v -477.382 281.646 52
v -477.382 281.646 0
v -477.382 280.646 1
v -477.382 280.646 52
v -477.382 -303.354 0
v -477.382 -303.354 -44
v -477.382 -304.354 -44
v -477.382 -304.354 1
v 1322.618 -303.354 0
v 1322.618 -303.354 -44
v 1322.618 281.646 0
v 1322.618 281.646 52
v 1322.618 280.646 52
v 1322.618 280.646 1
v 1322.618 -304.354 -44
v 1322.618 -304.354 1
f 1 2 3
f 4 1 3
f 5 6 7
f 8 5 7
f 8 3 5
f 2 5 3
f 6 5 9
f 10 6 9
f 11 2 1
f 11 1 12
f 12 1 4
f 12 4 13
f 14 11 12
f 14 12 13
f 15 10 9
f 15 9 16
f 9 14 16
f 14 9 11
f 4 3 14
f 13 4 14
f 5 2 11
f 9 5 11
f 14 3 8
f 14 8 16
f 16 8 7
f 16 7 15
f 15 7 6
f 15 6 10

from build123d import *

# Parameters (mm, degrees)
F0_W     = 1800
F0_H     = 585
F1_DEPTH = 1
F0_H_2   = 1
F2_DEPTH = 52
F3_W     = 1800
F3_H     = 1
F4_DEPTH = 44


with BuildPart() as f1:
    # F0 (on Top) → F1 (new body)
    with BuildSketch(Plane.XY):
        with Locations((422.617722, -11.85421)):
            Rectangle(F0_W, F0_H)
    extrude(amount=F1_DEPTH)

    # F0 (on Top) → F2 (join)
    with BuildSketch(Plane.XY):
        with Locations((422.617722, 281.14579)):
            Rectangle(F0_W, F0_H_2)
    extrude(amount=F2_DEPTH)

    # F3 (on face) → F4 (join)
    with BuildSketch(Plane(origin=(0, 0, 0), x_dir=(1, 0, 0), z_dir=(0, 0, -1))):
        with Locations((422.617722, 303.85421)):
            Rectangle(F3_W, F3_H)
    extrude(amount=F4_DEPTH)


solid = f1.part
